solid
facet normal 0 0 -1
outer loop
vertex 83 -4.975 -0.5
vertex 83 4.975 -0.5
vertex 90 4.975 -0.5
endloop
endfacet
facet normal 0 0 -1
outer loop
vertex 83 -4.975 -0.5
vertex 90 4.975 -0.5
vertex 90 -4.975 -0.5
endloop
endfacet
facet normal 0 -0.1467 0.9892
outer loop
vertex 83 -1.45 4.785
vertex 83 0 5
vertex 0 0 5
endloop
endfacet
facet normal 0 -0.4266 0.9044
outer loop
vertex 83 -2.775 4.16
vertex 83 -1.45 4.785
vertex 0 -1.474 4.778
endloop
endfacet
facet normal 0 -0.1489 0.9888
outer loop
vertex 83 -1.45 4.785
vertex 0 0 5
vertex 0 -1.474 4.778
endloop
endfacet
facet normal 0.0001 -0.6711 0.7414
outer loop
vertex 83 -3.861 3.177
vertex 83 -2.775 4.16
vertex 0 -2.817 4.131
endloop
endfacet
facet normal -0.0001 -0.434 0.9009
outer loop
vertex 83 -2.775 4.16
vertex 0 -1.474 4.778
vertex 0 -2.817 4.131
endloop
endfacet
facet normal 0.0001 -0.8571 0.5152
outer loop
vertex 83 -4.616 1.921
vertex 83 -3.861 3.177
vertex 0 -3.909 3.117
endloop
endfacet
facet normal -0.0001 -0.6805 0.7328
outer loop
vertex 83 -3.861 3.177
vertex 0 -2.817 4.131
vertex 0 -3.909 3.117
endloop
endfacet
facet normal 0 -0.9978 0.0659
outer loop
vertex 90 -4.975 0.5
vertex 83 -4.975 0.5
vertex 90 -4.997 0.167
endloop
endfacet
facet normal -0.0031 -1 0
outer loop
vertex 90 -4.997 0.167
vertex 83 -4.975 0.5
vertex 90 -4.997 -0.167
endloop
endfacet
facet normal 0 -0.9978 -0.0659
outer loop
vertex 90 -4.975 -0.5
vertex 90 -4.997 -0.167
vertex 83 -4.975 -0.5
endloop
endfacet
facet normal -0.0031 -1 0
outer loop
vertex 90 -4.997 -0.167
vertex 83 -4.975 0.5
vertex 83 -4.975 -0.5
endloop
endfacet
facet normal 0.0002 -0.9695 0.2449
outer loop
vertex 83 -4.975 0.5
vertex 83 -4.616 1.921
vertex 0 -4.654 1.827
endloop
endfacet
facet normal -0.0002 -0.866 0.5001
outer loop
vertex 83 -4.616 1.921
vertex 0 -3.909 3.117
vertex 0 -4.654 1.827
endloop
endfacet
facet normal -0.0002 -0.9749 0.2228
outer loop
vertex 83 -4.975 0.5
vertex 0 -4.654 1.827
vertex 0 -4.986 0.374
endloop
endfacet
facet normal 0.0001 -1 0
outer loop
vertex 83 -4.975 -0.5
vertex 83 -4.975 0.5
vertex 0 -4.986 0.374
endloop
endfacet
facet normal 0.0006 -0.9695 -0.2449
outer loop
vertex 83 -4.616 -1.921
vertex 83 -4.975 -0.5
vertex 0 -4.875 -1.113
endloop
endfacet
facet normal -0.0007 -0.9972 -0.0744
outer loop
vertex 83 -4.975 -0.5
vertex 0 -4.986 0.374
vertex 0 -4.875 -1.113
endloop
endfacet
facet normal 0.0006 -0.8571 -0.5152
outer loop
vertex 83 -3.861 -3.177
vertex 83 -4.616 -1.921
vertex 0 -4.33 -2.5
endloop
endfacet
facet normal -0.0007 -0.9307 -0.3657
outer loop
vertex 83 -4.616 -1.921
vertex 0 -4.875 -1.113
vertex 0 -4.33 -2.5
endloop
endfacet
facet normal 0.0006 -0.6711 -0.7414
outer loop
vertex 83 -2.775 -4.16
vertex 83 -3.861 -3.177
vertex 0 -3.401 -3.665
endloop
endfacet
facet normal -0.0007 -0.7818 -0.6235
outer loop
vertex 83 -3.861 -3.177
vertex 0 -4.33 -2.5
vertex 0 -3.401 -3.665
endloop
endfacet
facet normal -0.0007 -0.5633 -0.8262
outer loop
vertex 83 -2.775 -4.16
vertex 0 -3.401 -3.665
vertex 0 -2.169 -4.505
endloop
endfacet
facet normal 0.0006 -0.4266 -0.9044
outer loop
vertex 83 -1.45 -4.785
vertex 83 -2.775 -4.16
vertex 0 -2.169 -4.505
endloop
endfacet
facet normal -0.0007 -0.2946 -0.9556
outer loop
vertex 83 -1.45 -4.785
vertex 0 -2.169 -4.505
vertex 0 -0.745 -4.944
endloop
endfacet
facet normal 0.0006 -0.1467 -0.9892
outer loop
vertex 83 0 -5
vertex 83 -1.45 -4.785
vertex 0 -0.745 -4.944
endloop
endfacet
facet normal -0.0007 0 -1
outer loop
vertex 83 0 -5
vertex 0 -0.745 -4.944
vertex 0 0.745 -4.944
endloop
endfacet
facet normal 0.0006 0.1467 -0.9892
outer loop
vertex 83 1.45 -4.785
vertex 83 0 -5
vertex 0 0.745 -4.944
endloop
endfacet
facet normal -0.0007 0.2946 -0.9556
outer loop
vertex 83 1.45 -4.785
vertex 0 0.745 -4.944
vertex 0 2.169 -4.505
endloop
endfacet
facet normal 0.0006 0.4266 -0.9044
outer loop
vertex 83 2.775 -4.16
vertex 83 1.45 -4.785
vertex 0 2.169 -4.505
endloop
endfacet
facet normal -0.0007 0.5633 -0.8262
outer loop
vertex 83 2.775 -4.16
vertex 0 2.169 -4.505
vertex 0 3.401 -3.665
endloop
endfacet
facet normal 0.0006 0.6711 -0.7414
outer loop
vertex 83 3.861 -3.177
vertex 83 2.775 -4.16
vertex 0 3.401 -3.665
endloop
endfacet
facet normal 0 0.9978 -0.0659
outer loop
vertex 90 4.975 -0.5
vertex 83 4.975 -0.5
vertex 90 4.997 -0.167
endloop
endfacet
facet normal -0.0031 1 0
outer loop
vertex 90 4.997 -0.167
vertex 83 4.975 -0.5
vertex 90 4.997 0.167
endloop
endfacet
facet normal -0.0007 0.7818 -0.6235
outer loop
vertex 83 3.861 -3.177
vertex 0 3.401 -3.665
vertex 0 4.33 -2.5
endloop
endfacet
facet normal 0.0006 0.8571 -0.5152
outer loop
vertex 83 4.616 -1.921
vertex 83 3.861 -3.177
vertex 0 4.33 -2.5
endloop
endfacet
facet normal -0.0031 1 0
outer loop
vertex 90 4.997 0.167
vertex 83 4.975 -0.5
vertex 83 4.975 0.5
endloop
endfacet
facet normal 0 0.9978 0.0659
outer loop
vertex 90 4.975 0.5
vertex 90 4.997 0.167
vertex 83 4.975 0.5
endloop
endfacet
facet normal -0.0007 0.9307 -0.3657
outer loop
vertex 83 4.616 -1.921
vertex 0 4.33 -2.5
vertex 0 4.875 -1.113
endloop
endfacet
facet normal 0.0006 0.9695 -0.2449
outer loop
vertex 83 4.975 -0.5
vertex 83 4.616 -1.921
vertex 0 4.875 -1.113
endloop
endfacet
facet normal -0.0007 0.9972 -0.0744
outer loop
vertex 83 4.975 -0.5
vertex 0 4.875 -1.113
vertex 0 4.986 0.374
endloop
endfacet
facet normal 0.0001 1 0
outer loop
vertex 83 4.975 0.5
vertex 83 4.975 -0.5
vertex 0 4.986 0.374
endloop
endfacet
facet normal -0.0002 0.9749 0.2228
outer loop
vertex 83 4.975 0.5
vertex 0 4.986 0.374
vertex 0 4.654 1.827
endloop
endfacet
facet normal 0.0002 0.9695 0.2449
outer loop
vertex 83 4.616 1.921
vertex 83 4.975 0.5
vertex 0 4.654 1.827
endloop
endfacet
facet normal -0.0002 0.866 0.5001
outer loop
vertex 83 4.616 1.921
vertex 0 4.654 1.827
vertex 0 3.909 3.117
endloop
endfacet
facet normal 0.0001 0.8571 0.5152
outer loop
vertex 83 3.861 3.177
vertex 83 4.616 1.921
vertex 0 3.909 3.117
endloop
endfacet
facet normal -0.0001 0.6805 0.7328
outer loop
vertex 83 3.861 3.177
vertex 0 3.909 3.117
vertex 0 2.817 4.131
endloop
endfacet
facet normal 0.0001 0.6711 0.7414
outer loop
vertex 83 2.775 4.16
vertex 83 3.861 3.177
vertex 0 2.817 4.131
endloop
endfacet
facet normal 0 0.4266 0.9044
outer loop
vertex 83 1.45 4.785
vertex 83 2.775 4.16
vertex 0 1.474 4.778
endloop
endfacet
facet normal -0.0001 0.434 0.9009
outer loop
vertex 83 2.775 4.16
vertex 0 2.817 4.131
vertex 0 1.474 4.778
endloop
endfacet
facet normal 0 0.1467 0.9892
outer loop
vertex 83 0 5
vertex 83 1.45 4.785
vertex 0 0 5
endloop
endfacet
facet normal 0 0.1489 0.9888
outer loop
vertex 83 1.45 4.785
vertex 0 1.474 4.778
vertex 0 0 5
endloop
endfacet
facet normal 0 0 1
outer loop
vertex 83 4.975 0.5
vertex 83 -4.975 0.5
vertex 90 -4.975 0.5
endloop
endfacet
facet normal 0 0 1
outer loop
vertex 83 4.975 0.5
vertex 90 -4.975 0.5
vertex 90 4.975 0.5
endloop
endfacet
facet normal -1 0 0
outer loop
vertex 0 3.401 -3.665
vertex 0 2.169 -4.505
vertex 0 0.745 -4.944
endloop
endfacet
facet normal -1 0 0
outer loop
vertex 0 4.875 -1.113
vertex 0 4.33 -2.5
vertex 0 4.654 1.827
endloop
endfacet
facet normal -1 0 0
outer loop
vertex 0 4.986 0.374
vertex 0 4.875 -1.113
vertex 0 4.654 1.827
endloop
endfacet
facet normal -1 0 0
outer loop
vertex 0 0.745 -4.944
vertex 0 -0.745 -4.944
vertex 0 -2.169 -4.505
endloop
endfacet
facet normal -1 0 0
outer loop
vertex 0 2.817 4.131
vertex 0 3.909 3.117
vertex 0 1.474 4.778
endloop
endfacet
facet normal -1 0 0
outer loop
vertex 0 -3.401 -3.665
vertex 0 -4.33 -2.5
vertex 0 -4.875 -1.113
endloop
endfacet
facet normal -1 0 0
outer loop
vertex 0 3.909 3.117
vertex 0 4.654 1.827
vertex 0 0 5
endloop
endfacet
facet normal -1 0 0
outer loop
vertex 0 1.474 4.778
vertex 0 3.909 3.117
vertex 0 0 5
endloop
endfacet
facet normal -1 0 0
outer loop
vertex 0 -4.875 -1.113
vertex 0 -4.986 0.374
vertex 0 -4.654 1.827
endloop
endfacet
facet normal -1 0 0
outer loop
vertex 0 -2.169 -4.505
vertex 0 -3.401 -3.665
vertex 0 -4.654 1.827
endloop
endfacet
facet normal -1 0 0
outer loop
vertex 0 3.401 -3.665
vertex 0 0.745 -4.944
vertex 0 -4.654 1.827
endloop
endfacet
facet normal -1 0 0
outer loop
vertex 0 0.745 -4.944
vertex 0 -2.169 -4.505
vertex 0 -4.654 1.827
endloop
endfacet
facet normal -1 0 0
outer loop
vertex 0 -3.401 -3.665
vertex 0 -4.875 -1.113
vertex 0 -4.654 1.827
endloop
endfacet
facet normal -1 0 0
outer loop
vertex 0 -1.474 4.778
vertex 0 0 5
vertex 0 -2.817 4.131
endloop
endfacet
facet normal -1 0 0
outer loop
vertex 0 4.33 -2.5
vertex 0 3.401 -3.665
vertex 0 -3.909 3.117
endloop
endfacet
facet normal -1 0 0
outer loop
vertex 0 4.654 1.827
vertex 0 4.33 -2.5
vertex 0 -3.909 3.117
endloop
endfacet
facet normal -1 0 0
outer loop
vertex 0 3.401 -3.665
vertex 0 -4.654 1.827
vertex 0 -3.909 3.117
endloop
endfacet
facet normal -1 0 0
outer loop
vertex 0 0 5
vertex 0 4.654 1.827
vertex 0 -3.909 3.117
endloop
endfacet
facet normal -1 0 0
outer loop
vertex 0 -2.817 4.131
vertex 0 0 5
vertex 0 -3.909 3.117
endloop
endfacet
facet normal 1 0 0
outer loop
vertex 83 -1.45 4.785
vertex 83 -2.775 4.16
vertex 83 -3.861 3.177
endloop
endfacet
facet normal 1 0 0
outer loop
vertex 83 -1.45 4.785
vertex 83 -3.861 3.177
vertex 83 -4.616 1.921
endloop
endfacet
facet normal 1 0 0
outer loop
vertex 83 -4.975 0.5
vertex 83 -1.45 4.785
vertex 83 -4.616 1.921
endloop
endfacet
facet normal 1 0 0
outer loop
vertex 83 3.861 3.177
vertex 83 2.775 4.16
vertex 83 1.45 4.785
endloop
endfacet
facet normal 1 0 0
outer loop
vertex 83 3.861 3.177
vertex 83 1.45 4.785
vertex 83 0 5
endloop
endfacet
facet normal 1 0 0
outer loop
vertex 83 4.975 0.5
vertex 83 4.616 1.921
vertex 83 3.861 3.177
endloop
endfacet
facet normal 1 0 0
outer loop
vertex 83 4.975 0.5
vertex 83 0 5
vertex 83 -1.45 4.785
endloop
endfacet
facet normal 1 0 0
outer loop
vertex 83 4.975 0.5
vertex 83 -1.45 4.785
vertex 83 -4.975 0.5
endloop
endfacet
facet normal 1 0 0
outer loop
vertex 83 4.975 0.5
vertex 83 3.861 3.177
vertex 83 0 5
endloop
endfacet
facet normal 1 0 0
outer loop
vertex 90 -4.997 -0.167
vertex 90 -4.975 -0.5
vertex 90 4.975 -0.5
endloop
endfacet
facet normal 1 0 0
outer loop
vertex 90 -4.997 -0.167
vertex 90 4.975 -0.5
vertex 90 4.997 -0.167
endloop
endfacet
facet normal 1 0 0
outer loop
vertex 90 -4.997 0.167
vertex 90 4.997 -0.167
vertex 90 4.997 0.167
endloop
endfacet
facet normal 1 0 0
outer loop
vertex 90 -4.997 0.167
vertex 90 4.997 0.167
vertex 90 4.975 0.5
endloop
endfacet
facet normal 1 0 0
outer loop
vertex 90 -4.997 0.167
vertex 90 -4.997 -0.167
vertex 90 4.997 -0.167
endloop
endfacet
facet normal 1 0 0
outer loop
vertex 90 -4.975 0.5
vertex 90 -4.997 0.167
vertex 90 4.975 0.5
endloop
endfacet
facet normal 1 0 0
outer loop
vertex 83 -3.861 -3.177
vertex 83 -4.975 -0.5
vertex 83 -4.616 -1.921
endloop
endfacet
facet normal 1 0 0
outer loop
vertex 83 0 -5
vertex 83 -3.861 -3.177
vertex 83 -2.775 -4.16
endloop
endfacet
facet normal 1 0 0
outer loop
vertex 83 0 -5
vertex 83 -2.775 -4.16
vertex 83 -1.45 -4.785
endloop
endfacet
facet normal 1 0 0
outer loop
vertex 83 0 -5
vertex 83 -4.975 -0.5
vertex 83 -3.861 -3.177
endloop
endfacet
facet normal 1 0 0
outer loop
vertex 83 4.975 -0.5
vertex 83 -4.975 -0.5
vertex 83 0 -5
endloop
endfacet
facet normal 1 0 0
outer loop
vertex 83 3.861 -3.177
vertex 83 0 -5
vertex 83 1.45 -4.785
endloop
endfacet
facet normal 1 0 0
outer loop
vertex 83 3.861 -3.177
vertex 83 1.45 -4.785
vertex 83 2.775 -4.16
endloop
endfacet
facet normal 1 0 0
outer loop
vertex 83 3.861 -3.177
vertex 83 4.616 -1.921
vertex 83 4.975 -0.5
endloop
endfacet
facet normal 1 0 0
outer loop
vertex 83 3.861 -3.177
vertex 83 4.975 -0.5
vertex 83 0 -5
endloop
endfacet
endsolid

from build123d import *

# Parameters (mm, degrees)
SKETCH1_R     = 5
CORPO_DEPTH   = 90
ABA_START     = -7
ABA_1MM_DEPTH = 7


with BuildPart() as part:
    # Sketch1 → Corpo (new body)
    with BuildSketch(Plane(origin=(0, 0, 0), x_dir=(0, 0, -1), z_dir=(1, 0, 0))):
        with Locations(Location((0, 0, 0), (0, 0, 180))):
            Circle(SKETCH1_R)
    extrude(amount=CORPO_DEPTH)

    # Sketch2 → Aba 1mm (cut)
    with BuildSketch(Plane(origin=(90, 0, 0), x_dir=(0, 0, -1), z_dir=(1, 0, 0)).offset(ABA_START)):
        with BuildLine():
            ThreePointArc((-0.5, 4.974937186), (-5, 0), (-0.5, -4.974937186))
            Line((-0.5, -4.974937186), (-0.5, 4.974937186))
        make_face()
        with BuildLine():
            Line((0.5, 4.974937186), (0.5, -4.974937186))
            ThreePointArc((0.5, -4.974937186), (3.708099244, -3.354101966), (5, 0))
            ThreePointArc((5, 0), (3.708099244, 3.354101966), (0.5, 4.974937186))
        make_face()
    extrude(amount=ABA_1MM_DEPTH, mode=Mode.SUBTRACT)


solid = part.part
